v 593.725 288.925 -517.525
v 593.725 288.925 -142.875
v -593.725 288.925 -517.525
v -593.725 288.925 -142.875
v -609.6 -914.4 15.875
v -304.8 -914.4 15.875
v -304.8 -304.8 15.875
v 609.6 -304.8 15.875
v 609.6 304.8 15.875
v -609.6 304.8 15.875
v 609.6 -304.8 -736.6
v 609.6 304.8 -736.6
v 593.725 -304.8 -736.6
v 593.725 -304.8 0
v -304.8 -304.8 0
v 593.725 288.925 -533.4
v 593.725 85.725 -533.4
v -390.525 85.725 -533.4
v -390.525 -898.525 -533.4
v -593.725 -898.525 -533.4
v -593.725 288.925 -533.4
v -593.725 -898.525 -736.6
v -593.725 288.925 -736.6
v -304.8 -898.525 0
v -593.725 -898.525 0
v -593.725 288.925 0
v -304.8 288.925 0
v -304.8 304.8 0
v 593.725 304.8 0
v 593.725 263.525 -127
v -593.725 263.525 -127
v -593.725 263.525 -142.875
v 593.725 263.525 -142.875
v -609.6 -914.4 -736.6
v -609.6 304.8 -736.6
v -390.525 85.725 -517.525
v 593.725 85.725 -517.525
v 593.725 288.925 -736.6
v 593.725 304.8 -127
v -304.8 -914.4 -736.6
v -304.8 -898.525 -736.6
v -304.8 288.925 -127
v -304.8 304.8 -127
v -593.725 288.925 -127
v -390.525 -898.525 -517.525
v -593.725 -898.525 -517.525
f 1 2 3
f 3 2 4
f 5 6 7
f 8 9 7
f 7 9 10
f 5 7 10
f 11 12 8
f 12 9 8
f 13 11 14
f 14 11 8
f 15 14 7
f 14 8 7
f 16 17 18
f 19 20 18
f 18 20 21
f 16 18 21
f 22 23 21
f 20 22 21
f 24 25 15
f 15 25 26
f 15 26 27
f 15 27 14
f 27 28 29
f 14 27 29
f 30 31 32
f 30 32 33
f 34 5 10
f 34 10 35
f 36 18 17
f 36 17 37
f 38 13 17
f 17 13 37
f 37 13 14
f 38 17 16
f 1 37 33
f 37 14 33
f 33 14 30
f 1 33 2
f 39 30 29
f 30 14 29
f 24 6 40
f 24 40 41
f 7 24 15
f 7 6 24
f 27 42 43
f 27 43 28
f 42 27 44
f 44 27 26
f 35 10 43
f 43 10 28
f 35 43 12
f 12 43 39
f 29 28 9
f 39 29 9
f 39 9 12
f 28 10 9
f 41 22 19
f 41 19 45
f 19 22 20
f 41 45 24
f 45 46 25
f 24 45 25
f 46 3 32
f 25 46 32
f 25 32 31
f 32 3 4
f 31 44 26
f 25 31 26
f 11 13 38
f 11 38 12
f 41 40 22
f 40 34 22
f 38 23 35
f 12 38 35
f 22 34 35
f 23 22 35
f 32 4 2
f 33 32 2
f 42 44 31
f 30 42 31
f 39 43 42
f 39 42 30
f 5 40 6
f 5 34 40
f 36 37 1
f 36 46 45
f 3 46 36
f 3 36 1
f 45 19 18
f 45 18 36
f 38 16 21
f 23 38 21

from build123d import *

# Parameters (mm, degrees)
F0_W      = 1219.2
F0_H      = 609.6
F1_DEPTH  = 15.875
F3_DEPTH  = 736.6
F4_W      = 1187.45
F4_H      = 15.875
F5_DEPTH  = 25.4
F6_W      = 898.525
F6_H      = 127
F7_DEPTH  = 25.4
F9_DEPTH  = 609.6
F10_W     = 15.875
F10_H     = 736.6
F11_DEPTH = 288.925
F12_W     = 203.2
F12_H     = 15.875
F13_DEPTH = 1187.45
F14_W     = 203.2
F14_H     = 15.875
F15_DEPTH = 984.25


with BuildPart() as f1:
    # F0 (on Top) → F1 (new body)
    with BuildSketch(Plane.XY):
        Rectangle(F0_W, F0_H)
    extrude(amount=F1_DEPTH)

    # F2 (on face) → F3 (join)
    with BuildSketch(Plane(origin=(0, 0, 0), x_dir=(1, 0, 0), z_dir=(0, 0, -1))):
        Polygon((593.725, -288.925), (-593.725, -288.925), (-593.725, 304.8), (-609.6, 304.8), (-609.6, -304.8), (609.6, -304.8), (609.6, 304.8), (593.725, 304.8), align=None)
    extrude(amount=F3_DEPTH)

    # F4 (on face) → F5 (join)
    with BuildSketch(Plane.XZ.offset(-288.925)):
        with Locations((0, -134.9375)):
            Rectangle(F4_W, F4_H)
    extrude(amount=F5_DEPTH)

    # F6 (on face) → F7 (cut)
    with BuildSketch(Plane.XZ.offset(-288.925)):
        with Locations((144.4625, -63.5)):
            Rectangle(F6_W, F6_H)
    extrude(amount=-F7_DEPTH, mode=Mode.SUBTRACT)

    # F8 (on face) → F9 (join)
    with BuildSketch(Plane.XZ.offset(304.8)):
        Polygon((-304.8, 0), (-304.8, 15.875), (-609.6, 15.875), (-609.6, -736.6), (-593.725, -736.6), (-593.725, 0), align=None)
    extrude(amount=F9_DEPTH)

    # F10 (on face) → F11 (join)
    with BuildSketch(Plane.YZ.offset(-593.725)):
        with Locations((-906.4625, -368.3)):
            Rectangle(F10_W, F10_H)
    extrude(amount=F11_DEPTH)

    # F12 (on face) → F13 (join)
    with BuildSketch(Plane(origin=(0, -898.525, 0), x_dir=(-1, 0, 0), z_dir=(0, 1, 0))):
        with Locations((492.125, -525.4625)):
            Rectangle(F12_W, F12_H)
    extrude(amount=F13_DEPTH)

    # F14 (on face) → F15 (join)
    with BuildSketch(Plane.YZ.offset(-390.525)):
        with Locations((187.325, -525.4625)):
            Rectangle(F14_W, F14_H)
    extrude(amount=F15_DEPTH)


solid = f1.part
